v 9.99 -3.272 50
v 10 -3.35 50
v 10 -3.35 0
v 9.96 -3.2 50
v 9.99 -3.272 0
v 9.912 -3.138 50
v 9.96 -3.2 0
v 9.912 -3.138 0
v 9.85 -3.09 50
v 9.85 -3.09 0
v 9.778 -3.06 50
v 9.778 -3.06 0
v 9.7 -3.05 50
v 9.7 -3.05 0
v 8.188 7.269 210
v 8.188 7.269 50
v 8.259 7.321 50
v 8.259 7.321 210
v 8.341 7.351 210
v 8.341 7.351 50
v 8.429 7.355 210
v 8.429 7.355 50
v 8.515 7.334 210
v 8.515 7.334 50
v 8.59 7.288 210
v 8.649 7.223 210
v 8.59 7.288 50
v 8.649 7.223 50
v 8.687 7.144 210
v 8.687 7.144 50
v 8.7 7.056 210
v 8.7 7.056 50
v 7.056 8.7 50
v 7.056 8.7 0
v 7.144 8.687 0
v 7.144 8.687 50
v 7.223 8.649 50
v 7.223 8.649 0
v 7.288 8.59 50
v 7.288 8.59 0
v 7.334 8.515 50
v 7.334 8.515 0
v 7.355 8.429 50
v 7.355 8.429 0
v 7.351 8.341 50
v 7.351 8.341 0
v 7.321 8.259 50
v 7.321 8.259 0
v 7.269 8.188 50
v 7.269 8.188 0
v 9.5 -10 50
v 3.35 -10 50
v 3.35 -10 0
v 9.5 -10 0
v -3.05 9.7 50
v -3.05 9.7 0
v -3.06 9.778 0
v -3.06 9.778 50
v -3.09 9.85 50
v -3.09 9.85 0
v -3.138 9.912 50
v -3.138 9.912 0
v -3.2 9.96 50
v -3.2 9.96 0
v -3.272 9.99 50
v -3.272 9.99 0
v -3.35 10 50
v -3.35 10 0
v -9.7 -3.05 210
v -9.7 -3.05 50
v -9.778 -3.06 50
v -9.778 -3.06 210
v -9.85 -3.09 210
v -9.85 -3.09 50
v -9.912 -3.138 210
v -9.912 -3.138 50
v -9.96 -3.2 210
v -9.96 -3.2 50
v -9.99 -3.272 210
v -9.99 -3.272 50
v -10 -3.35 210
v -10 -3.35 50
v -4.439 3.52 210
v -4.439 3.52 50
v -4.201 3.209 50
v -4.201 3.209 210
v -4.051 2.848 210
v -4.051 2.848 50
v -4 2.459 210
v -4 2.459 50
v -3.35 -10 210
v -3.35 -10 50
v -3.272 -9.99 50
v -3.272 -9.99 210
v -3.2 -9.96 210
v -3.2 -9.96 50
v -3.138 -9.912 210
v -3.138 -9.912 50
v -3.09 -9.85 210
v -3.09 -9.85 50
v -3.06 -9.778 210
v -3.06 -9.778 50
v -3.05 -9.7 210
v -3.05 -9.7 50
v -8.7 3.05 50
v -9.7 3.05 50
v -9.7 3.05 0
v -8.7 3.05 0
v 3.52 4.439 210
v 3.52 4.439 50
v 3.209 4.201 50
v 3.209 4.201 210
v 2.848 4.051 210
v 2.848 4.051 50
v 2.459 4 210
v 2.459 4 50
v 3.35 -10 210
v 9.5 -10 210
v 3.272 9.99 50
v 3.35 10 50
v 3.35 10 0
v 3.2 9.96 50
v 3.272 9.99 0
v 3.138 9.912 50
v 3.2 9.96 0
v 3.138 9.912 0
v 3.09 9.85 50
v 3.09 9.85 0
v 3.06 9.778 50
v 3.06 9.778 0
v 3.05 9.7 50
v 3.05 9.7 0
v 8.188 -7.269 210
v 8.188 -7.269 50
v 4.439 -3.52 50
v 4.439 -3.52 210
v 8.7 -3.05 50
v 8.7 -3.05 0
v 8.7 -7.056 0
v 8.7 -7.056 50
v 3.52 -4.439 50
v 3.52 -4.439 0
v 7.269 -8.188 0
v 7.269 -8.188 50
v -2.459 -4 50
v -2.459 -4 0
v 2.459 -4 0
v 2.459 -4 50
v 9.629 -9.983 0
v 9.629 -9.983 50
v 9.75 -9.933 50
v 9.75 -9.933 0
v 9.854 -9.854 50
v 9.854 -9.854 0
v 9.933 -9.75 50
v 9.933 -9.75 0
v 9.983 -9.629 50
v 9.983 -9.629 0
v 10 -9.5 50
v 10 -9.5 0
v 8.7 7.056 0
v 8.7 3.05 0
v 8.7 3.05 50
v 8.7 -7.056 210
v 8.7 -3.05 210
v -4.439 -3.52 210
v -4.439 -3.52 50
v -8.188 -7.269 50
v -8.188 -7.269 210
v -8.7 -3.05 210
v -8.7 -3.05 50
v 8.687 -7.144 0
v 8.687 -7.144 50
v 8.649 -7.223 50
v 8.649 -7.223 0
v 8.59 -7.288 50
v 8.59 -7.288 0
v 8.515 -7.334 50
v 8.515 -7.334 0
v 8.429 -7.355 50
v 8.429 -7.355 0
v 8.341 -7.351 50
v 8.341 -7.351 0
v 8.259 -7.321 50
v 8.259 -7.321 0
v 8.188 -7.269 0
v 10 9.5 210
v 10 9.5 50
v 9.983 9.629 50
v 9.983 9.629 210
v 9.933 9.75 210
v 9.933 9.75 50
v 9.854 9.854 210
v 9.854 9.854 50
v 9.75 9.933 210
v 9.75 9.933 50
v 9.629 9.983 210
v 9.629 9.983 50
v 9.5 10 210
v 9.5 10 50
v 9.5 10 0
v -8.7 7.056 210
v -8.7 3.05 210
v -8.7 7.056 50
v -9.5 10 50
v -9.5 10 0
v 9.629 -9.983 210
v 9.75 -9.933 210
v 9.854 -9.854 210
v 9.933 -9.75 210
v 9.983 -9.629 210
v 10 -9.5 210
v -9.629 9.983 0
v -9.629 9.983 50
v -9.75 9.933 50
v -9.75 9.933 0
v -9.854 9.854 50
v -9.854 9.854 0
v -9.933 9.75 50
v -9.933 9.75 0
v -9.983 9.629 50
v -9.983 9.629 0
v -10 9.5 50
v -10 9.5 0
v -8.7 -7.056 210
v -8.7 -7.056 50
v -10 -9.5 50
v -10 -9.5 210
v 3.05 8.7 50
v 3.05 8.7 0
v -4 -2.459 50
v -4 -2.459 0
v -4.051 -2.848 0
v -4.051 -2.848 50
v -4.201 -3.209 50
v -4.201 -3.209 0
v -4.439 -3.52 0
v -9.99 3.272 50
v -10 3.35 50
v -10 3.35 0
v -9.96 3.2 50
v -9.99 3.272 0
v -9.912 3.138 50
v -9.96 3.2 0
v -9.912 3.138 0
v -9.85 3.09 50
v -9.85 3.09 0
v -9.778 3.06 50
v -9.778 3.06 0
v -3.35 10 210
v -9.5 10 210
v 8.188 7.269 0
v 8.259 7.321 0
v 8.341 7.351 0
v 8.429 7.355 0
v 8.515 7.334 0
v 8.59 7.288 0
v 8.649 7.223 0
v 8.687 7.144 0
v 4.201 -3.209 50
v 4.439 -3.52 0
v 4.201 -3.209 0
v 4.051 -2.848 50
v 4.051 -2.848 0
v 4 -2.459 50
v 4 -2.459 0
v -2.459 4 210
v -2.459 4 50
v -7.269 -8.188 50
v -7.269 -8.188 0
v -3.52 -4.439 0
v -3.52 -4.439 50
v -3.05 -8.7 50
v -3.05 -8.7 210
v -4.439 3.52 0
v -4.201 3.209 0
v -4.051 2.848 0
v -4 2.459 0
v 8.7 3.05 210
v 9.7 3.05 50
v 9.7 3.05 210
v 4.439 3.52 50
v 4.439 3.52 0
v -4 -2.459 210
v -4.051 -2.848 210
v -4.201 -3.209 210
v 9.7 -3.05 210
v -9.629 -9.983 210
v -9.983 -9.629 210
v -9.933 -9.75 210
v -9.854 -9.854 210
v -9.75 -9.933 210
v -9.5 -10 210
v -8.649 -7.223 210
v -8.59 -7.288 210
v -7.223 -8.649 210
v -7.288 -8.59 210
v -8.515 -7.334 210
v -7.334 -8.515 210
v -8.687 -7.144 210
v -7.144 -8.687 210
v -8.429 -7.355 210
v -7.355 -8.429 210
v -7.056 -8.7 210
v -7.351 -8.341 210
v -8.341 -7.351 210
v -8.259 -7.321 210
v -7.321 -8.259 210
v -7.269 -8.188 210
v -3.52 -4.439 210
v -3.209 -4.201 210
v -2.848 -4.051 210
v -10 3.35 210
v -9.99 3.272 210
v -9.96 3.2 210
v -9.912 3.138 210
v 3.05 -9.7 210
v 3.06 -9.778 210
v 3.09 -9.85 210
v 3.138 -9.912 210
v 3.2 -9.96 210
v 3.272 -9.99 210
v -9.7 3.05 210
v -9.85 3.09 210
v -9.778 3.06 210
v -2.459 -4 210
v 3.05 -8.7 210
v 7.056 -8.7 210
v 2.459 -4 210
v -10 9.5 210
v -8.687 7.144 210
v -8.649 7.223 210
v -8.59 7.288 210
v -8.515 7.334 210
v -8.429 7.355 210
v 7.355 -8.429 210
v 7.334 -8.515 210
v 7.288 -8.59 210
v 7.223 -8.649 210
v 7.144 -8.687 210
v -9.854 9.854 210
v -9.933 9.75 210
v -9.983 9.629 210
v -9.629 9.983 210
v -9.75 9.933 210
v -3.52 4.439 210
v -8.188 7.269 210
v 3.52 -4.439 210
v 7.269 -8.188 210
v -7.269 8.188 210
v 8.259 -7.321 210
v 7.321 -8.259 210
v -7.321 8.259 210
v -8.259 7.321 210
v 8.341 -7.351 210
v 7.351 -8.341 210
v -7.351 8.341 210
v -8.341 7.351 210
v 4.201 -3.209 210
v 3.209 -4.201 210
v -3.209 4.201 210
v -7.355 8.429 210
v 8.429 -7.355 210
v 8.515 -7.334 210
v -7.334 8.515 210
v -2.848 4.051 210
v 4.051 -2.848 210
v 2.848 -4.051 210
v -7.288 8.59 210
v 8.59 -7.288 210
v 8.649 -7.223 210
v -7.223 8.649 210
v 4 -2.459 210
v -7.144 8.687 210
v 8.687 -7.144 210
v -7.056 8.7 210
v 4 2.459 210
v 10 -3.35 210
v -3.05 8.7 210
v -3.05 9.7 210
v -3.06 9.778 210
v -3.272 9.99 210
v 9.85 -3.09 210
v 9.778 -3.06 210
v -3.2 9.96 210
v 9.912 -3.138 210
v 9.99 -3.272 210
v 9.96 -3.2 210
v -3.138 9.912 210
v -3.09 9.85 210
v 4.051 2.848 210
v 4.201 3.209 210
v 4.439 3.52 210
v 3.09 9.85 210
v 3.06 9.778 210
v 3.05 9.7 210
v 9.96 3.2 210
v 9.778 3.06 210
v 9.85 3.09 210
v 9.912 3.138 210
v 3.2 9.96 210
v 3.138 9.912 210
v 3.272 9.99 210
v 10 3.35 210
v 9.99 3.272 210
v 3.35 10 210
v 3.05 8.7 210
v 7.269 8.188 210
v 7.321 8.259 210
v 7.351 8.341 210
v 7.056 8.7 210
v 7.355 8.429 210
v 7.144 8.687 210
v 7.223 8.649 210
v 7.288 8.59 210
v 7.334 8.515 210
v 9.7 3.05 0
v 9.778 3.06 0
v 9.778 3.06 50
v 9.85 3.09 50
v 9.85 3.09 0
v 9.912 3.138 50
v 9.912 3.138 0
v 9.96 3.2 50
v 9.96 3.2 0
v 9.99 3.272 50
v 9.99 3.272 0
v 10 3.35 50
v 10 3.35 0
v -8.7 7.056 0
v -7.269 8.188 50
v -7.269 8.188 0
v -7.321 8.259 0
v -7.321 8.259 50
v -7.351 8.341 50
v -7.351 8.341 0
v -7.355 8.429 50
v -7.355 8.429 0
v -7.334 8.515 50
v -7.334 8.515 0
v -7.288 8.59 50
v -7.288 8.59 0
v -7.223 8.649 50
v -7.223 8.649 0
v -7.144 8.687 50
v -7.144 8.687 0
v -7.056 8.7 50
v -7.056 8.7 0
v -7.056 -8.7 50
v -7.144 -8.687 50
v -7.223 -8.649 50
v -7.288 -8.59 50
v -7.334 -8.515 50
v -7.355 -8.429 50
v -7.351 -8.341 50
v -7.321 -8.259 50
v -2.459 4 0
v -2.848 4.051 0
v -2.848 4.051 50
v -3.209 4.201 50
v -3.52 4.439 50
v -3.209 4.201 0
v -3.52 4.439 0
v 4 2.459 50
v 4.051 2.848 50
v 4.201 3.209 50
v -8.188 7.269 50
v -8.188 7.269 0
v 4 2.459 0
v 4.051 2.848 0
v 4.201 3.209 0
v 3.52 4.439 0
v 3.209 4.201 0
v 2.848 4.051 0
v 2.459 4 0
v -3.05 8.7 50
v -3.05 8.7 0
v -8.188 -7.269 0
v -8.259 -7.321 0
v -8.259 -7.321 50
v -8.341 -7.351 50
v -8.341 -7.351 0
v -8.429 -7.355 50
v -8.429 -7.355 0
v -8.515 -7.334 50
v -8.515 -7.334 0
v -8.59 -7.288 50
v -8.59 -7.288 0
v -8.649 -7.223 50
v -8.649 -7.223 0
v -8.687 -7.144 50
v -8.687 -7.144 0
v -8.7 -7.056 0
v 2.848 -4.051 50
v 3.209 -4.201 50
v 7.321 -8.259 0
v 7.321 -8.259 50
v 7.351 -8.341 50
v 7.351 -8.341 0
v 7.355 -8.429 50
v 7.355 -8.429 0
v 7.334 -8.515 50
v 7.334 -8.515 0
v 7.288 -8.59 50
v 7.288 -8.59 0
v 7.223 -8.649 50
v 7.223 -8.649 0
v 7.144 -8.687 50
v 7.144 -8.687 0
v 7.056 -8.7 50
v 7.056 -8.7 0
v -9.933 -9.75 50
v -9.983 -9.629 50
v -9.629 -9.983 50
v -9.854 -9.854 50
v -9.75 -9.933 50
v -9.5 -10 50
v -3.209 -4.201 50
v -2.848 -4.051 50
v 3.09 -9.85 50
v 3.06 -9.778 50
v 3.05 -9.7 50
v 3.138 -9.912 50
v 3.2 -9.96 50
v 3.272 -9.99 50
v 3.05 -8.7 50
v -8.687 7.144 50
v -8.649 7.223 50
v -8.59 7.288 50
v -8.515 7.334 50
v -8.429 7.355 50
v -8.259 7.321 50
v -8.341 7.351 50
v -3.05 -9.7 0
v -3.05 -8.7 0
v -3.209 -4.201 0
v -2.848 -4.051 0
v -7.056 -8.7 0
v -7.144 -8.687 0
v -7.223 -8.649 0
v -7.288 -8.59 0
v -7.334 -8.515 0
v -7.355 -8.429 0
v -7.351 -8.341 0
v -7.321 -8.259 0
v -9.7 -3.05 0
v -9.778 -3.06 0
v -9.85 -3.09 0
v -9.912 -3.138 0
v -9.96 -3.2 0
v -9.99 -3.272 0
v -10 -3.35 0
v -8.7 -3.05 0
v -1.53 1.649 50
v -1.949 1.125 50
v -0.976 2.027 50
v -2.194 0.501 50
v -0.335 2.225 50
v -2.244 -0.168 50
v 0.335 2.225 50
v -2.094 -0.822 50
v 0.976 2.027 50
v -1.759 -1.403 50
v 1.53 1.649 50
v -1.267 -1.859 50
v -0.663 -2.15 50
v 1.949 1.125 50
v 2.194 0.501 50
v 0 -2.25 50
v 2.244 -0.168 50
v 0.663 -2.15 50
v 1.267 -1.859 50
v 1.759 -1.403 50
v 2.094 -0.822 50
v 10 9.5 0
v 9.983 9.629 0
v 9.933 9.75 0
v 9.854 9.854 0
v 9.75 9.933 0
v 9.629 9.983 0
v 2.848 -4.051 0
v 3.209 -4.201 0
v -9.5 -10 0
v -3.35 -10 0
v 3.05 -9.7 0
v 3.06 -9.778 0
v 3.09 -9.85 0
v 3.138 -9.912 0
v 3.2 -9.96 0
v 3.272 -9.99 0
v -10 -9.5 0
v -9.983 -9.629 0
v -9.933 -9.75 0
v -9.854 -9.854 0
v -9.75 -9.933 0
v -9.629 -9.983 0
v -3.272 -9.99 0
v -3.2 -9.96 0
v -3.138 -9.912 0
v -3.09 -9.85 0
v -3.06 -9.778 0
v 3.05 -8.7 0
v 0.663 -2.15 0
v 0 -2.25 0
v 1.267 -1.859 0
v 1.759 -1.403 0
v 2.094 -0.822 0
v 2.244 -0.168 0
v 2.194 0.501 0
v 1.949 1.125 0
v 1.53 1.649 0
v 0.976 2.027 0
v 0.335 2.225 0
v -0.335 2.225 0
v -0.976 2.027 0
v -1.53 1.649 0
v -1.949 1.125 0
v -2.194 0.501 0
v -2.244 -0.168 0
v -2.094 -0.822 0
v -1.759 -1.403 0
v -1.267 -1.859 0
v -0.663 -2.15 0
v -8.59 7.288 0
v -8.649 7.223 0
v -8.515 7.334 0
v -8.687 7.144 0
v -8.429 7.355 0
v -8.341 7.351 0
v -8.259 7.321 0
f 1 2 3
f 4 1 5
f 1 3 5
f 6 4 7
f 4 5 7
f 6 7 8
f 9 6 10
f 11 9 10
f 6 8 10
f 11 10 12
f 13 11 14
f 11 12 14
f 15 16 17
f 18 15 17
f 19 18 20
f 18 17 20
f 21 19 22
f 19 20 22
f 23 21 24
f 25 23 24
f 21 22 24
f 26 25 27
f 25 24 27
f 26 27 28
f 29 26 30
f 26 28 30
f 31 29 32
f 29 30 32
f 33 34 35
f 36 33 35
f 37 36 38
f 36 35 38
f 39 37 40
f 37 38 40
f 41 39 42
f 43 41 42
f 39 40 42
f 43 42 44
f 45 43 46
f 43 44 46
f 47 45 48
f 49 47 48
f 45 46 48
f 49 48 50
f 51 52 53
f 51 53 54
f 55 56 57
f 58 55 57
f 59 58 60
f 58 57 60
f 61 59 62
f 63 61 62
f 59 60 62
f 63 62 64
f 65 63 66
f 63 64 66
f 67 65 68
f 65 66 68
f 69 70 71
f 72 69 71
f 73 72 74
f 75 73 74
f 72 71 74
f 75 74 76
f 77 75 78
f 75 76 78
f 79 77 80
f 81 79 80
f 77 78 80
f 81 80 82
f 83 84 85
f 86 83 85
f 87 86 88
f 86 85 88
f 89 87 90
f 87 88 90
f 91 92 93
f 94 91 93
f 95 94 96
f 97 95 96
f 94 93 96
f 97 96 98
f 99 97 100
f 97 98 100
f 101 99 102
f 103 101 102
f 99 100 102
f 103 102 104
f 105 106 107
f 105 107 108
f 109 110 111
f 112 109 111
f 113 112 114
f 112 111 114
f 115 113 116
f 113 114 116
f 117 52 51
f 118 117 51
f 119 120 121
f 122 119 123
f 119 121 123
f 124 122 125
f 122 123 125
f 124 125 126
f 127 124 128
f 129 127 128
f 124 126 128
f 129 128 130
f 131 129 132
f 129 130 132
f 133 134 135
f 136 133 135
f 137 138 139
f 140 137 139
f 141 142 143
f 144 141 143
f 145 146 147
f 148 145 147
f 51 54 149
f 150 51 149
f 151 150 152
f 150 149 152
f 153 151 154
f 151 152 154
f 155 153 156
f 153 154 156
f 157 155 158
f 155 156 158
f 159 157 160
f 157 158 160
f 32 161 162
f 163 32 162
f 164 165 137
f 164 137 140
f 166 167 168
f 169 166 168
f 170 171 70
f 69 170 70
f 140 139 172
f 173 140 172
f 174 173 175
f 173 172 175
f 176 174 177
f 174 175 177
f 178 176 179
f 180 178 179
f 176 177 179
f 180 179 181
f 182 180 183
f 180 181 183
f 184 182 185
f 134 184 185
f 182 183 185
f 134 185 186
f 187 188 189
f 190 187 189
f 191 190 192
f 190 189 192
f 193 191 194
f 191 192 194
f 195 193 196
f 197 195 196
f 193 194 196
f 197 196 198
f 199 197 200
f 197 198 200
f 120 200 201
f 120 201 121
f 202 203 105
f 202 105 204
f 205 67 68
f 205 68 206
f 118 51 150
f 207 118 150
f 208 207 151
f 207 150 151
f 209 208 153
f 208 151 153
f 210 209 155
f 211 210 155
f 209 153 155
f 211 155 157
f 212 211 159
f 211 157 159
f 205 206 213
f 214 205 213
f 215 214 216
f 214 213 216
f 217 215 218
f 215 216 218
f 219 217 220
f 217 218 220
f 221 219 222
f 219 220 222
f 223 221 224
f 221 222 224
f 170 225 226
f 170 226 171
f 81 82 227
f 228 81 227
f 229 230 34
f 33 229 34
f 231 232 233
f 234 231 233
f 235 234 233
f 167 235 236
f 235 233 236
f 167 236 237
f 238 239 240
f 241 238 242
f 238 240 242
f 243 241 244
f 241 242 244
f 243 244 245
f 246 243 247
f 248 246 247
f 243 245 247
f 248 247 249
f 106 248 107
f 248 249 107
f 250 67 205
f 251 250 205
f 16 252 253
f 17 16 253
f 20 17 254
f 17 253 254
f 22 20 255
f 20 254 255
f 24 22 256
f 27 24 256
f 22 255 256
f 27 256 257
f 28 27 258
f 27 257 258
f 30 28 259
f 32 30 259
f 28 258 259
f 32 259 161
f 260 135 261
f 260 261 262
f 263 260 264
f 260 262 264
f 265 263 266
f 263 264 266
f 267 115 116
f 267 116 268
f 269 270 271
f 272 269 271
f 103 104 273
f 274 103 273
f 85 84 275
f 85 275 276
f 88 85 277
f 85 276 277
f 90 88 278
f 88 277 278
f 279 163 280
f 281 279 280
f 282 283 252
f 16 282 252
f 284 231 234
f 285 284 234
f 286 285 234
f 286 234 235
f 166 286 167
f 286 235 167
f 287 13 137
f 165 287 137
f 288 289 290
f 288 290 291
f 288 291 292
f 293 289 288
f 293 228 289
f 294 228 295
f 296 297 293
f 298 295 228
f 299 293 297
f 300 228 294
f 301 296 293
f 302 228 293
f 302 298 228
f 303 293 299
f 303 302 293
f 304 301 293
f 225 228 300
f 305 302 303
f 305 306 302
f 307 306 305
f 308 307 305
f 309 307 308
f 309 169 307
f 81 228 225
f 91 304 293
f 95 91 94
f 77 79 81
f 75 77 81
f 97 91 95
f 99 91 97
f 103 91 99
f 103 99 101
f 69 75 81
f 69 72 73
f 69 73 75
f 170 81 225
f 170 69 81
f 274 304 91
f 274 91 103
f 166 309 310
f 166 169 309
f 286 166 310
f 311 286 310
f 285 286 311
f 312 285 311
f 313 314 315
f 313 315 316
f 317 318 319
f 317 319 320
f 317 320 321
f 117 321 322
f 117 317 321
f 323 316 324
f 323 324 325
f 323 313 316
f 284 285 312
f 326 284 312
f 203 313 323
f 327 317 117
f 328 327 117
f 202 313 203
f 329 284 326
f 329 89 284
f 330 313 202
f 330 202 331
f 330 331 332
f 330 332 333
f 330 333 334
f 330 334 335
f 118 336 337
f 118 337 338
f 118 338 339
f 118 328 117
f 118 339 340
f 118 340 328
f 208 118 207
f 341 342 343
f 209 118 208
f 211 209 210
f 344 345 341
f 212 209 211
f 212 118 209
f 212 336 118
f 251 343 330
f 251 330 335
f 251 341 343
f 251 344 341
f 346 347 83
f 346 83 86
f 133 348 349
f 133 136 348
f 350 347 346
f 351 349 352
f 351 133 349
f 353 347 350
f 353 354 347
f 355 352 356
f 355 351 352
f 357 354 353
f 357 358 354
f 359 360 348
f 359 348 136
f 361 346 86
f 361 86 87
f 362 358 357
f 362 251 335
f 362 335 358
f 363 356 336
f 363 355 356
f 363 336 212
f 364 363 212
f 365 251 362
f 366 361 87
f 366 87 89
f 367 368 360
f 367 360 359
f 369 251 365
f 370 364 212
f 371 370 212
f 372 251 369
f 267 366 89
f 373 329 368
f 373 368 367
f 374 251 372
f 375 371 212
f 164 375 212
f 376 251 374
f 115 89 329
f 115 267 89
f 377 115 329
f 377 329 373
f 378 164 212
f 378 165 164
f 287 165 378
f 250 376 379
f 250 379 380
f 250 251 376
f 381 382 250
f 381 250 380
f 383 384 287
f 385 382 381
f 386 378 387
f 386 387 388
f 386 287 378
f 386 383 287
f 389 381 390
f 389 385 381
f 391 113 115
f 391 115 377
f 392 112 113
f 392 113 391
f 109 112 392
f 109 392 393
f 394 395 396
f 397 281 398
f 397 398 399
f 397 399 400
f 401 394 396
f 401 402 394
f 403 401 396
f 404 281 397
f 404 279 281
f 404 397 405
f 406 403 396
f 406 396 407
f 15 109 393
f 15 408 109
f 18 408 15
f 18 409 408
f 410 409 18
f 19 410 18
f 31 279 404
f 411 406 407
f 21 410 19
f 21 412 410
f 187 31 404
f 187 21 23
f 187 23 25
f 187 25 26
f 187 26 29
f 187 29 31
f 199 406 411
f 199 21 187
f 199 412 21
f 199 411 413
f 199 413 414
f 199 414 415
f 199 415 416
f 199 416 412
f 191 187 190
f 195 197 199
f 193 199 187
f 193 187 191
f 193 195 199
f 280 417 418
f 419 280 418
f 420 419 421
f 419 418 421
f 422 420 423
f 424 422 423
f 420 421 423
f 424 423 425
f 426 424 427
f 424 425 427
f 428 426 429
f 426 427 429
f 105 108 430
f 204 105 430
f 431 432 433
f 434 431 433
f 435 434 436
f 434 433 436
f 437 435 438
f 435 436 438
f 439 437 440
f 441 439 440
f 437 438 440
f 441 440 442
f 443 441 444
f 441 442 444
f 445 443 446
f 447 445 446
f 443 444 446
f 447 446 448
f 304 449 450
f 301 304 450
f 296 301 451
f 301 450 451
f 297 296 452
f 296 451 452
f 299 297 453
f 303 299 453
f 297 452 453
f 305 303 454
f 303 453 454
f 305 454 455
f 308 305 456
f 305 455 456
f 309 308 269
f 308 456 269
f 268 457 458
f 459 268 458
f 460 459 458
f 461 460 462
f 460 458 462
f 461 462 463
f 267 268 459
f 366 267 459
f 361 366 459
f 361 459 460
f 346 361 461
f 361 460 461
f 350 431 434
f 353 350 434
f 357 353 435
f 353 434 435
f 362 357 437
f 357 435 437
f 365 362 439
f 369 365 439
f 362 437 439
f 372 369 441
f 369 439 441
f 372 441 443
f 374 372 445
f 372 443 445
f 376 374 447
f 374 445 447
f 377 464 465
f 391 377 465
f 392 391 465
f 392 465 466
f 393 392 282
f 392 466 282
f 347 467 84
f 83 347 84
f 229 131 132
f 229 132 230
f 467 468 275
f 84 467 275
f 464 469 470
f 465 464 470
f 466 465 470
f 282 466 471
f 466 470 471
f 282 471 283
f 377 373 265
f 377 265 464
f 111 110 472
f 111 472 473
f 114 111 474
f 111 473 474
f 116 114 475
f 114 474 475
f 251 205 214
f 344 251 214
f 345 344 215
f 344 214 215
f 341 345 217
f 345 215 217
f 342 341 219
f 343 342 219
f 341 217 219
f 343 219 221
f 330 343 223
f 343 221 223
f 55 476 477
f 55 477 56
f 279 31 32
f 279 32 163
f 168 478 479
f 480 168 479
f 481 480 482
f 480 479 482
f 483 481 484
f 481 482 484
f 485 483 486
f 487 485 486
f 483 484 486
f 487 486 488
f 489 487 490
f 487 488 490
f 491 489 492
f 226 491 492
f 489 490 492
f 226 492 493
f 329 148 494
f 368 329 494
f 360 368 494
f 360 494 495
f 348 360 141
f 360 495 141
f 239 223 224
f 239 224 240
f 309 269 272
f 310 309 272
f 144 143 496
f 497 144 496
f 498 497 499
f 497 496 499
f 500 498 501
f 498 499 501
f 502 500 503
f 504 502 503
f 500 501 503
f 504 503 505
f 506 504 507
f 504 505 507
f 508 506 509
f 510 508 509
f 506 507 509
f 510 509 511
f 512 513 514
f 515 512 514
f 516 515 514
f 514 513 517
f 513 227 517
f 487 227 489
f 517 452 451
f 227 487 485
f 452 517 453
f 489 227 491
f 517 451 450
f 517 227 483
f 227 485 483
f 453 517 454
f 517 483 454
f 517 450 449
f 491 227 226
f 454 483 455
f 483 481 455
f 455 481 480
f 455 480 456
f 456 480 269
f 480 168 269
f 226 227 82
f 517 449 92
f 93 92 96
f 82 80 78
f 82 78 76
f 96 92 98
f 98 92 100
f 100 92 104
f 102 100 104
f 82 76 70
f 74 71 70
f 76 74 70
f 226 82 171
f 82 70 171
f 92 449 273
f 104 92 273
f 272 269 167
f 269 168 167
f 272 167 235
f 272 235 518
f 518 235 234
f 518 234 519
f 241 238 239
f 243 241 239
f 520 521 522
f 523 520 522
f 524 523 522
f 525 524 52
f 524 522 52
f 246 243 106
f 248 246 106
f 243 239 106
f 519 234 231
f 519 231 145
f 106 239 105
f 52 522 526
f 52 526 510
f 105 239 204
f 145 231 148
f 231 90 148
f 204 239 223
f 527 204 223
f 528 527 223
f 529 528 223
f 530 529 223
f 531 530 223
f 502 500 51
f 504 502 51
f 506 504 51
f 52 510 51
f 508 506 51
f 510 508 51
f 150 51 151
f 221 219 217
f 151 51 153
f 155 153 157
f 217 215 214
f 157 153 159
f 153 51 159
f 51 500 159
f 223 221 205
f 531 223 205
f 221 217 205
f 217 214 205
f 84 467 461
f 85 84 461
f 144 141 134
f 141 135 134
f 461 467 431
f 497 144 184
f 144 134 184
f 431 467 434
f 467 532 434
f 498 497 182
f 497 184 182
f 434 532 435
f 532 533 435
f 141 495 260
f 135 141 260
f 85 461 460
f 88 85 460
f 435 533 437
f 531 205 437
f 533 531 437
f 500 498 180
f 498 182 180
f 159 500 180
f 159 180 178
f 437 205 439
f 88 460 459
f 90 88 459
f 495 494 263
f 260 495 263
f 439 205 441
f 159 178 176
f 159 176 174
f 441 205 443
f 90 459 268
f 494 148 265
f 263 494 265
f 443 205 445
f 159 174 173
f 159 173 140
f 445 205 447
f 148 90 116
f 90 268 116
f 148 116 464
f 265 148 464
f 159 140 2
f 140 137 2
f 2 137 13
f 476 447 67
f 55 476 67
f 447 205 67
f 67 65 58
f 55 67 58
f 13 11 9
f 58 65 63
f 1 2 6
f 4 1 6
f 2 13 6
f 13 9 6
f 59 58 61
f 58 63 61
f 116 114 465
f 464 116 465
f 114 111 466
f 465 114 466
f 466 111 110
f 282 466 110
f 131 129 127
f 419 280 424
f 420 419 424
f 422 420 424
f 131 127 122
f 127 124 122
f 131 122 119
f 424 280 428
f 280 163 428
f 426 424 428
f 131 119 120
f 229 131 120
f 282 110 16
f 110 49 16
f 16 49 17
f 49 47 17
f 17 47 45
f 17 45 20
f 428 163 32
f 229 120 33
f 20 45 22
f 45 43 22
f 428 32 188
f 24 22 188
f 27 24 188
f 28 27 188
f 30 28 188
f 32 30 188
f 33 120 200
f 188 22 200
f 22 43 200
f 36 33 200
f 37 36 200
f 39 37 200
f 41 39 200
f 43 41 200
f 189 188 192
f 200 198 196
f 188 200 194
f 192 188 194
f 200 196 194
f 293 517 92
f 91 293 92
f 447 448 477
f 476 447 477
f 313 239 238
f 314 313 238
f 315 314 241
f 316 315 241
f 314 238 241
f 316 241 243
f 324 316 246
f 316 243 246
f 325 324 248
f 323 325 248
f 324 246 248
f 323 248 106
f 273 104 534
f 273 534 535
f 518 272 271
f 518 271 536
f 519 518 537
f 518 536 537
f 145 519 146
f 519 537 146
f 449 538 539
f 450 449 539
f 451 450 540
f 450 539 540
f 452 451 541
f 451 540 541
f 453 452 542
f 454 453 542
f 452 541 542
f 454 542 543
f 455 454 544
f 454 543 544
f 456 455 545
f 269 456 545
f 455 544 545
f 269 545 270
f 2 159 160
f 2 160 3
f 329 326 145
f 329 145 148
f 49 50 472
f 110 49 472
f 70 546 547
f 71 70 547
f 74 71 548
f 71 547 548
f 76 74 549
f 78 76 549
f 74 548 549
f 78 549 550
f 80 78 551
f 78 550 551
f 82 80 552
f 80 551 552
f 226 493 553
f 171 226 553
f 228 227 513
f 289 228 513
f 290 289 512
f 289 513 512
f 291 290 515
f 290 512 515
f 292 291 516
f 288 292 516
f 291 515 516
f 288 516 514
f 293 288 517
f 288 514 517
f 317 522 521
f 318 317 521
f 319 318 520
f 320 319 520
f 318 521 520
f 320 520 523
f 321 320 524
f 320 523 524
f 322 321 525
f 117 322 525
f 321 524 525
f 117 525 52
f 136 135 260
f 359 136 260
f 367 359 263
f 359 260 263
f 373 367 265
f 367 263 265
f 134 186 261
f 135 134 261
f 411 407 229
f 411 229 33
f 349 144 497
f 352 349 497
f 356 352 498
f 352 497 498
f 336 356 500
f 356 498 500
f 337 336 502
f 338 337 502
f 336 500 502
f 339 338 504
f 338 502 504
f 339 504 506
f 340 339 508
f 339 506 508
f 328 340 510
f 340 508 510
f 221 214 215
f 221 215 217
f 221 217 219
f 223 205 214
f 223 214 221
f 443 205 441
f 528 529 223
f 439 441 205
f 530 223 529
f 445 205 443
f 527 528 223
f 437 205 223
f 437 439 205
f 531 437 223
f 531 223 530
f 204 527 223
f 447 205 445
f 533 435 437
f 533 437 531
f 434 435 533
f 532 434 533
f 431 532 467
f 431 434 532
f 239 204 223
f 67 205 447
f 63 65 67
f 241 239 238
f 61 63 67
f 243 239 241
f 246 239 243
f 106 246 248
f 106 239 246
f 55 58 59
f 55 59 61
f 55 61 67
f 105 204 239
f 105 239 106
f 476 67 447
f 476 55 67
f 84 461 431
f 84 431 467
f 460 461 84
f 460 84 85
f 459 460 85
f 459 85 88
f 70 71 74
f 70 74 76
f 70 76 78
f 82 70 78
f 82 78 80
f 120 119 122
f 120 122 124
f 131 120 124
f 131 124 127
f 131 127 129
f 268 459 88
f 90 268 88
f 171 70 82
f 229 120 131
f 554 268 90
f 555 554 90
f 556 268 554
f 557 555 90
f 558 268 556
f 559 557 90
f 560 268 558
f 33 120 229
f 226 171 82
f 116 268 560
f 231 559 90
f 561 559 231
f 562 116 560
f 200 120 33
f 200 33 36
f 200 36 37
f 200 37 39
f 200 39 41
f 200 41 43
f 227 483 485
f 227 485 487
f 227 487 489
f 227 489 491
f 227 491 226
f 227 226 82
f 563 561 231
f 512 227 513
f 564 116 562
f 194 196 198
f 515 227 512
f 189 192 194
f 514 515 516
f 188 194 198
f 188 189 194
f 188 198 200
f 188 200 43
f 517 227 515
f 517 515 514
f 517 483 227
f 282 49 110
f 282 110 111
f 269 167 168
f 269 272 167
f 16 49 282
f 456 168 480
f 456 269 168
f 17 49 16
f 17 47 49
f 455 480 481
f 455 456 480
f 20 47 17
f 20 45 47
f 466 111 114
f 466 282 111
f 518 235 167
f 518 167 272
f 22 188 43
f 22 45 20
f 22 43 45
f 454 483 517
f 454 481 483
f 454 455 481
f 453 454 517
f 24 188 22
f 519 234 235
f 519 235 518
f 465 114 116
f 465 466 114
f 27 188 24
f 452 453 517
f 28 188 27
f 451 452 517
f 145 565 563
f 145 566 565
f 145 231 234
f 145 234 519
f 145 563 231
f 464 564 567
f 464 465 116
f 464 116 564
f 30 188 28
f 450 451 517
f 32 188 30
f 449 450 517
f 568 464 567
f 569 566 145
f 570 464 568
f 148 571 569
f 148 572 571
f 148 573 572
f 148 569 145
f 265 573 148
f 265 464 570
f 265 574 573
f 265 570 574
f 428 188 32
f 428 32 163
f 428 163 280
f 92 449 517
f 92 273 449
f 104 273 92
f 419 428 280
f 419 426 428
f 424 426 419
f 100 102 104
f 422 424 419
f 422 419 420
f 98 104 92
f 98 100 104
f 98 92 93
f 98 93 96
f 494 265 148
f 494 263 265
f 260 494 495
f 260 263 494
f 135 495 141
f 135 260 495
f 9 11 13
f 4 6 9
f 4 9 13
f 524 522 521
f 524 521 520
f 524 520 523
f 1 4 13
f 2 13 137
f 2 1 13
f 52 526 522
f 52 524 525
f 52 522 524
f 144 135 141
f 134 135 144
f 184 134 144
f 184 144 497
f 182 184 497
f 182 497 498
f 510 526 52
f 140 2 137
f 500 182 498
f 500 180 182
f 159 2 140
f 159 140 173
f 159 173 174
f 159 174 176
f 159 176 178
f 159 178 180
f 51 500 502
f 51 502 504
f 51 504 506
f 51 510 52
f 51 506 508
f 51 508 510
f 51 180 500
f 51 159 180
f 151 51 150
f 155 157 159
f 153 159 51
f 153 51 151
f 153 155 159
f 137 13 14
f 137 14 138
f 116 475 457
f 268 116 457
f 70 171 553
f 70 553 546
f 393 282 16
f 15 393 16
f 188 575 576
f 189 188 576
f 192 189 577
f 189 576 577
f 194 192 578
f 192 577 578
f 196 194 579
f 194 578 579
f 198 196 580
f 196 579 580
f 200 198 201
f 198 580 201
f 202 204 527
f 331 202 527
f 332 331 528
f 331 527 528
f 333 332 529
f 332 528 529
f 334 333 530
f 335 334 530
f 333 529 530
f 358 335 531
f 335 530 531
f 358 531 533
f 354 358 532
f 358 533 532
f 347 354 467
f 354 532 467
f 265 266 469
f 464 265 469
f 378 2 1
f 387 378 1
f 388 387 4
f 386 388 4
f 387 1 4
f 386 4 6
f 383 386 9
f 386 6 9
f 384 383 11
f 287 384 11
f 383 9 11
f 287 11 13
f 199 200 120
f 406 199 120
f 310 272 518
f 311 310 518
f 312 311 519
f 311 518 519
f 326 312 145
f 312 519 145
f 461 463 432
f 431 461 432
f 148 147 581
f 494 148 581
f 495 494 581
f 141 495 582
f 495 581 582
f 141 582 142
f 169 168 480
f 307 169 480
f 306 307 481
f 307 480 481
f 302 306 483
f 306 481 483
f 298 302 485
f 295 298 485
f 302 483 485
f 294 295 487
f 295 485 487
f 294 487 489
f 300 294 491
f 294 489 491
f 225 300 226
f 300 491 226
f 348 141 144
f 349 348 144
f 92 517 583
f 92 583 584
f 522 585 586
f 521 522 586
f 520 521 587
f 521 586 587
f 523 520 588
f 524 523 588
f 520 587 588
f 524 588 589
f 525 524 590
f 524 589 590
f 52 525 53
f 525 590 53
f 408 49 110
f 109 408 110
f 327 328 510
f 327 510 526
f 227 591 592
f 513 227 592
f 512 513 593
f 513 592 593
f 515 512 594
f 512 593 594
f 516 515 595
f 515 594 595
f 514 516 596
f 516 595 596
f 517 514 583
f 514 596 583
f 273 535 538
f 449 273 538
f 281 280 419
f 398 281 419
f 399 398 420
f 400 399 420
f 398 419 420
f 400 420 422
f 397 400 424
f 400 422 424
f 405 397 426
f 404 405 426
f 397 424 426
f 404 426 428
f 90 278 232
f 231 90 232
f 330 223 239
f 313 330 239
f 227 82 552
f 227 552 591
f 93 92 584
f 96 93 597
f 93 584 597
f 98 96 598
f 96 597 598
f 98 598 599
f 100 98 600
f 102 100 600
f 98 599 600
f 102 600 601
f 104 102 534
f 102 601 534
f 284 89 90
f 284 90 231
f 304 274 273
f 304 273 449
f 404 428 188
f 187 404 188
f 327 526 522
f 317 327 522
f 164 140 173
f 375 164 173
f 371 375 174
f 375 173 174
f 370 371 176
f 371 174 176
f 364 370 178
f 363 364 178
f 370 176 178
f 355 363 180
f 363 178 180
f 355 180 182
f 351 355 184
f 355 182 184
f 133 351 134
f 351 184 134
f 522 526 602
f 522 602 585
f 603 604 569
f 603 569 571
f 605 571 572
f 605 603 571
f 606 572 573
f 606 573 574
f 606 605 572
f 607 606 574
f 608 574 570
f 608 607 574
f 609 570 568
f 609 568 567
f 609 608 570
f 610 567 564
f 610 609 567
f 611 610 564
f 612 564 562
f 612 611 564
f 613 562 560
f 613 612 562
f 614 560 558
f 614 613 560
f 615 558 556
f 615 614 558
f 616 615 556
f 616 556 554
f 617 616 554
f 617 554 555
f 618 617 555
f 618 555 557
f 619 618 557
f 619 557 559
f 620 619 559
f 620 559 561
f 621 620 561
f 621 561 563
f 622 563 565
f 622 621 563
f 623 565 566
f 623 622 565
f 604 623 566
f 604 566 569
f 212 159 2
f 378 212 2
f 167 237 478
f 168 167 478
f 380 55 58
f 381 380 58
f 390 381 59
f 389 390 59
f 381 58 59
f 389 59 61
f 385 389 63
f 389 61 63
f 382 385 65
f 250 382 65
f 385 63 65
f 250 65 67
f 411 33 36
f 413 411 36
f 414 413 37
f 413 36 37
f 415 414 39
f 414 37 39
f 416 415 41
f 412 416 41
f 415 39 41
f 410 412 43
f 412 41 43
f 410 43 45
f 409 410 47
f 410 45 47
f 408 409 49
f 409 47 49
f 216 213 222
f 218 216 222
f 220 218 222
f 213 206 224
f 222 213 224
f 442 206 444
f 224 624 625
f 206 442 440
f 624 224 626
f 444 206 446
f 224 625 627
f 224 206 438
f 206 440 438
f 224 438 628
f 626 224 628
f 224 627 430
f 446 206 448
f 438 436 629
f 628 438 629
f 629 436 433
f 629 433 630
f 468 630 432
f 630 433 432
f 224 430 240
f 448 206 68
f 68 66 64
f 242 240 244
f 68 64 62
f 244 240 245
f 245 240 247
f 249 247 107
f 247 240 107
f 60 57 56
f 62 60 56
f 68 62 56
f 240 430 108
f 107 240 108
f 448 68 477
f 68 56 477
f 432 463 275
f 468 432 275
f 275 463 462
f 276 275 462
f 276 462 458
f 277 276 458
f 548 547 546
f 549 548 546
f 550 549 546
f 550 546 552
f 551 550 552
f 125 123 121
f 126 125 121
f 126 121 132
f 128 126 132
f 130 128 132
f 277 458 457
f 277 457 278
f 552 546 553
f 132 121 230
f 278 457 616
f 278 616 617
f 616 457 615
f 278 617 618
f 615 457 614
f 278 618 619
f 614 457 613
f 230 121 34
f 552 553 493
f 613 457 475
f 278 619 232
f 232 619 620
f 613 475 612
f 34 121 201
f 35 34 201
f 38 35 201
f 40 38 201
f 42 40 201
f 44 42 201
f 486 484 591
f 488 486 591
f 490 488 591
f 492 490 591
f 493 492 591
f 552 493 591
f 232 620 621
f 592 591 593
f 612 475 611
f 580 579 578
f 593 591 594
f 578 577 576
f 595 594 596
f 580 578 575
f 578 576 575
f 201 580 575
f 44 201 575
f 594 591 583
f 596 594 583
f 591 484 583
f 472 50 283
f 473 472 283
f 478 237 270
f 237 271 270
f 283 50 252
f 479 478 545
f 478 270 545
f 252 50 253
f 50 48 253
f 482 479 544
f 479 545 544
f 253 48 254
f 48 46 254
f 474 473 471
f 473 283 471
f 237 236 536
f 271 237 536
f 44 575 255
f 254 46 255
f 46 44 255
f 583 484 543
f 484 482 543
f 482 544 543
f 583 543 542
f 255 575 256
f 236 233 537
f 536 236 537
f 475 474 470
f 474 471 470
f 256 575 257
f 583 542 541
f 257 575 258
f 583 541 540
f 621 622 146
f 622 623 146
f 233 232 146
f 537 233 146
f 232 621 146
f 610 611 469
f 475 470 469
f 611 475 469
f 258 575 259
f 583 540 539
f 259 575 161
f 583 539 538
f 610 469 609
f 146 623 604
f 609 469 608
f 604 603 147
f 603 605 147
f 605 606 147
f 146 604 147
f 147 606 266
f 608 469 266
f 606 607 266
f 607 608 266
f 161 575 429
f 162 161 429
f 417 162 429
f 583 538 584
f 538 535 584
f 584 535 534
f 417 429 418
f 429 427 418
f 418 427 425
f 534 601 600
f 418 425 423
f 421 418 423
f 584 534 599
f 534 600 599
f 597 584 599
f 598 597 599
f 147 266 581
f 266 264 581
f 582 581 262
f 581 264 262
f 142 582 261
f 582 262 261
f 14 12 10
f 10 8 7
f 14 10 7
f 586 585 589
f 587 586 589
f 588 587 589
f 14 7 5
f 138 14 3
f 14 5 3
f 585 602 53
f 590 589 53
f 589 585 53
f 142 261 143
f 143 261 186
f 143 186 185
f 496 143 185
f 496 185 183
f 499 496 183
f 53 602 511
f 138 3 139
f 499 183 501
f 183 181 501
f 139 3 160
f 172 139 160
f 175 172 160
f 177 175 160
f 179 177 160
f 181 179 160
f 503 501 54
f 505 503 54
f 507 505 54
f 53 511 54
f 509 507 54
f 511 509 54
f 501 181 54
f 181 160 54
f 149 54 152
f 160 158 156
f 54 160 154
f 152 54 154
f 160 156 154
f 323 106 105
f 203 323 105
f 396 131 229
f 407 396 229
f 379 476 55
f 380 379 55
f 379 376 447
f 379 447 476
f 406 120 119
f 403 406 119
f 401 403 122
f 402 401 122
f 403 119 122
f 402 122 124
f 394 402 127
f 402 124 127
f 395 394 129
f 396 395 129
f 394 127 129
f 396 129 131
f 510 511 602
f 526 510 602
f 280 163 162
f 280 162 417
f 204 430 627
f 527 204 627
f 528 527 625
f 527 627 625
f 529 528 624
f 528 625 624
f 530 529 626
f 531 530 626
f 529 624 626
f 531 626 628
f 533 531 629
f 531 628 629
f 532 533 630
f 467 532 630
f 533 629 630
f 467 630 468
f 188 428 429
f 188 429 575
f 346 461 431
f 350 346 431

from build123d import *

# Parameters (mm, degrees)
ESBO_O11_R                                   = 2.25
QUADRADO_PF20_21_PERFIL_2020_T_SLOT_6M_DEPTH = 50
SALIENTE_EXTRUIR1_DEPTH                      = 160


with BuildPart() as part:
    # Esboço11 → Quadrado PF20-21 - PERFIL 2020 T-SLOT 6MM(1) (new body)
    with BuildSketch(Plane(origin=(0, 0, 0), x_dir=(0, -1, 0), z_dir=(0, 0, 1))):
        with BuildLine():
            Line((8.187867966, -7.26862915), (4.439339828, -3.520101013))
            ThreePointArc((4.439339828, -3.520101013), (4.114180701, -3.033465989), (4, -2.459440841))
            Line((4, -2.459440841), (4, 2.459440841))
            ThreePointArc((4, 2.459440841), (4.114180701, 3.033465989), (4.439339828, 3.520101013))
            Line((4.439339828, 3.520101013), (8.187867966, 7.26862915))
            ThreePointArc((8.187867966, 7.26862915), (8.51480503, 7.333660975), (8.7, 7.056497116))
            Line((8.7, 7.056497116), (8.7, 3.05))
            Line((8.7, 3.05), (9.7, 3.05))
            ThreePointArc((9.7, 3.05), (9.912132034, 3.137867966), (10, 3.35))
            Line((10, 3.35), (10, 9.5))
            ThreePointArc((10, 9.5), (9.853553391, 9.853553391), (9.5, 10))
            Line((9.5, 10), (3.35, 10))
            ThreePointArc((3.35, 10), (3.137867966, 9.912132034), (3.05, 9.7))
            Line((3.05, 9.7), (3.05, 8.7))
            Line((3.05, 8.7), (7.056497116, 8.7))
            ThreePointArc((7.056497116, 8.7), (7.333660975, 8.51480503), (7.26862915, 8.187867966))
            Line((7.26862915, 8.187867966), (3.520101013, 4.439339828))
            ThreePointArc((3.520101013, 4.439339828), (3.033465989, 4.114180701), (2.459440841, 4))
            Line((2.459440841, 4), (-2.459440841, 4))
            ThreePointArc((-2.459440841, 4), (-3.033465989, 4.114180701), (-3.520101013, 4.439339828))
            Line((-3.520101013, 4.439339828), (-7.26862915, 8.187867966))
            ThreePointArc((-7.26862915, 8.187867966), (-7.333660975, 8.51480503), (-7.056497116, 8.7))
            Line((-7.056497116, 8.7), (-3.05, 8.7))
            Line((-3.05, 8.7), (-3.05, 9.7))
            ThreePointArc((-3.05, 9.7), (-3.137867966, 9.912132034), (-3.35, 10))
            Line((-3.35, 10), (-9.5, 10))
            ThreePointArc((-9.5, 10), (-9.853553391, 9.853553391), (-10, 9.5))
            Line((-10, 9.5), (-10, 3.35))
            ThreePointArc((-10, 3.35), (-9.912132034, 3.137867966), (-9.7, 3.05))
            Line((-9.7, 3.05), (-8.7, 3.05))
            Line((-8.7, 3.05), (-8.7, 7.056497116))
            ThreePointArc((-8.7, 7.056497116), (-8.51480503, 7.333660975), (-8.187867966, 7.26862915))
            Line((-8.187867966, 7.26862915), (-4.439339828, 3.520101013))
            ThreePointArc((-4.439339828, 3.520101013), (-4.114180701, 3.033465989), (-4, 2.459440841))
            Line((-4, 2.459440841), (-4, -2.459440841))
            ThreePointArc((-4, -2.459440841), (-4.114180701, -3.033465989), (-4.439339828, -3.520101013))
            Line((-4.439339828, -3.520101013), (-8.187867966, -7.26862915))
            ThreePointArc((-8.187867966, -7.26862915), (-8.51480503, -7.333660975), (-8.7, -7.056497116))
            Line((-8.7, -7.056497116), (-8.7, -3.05))
            Line((-8.7, -3.05), (-9.7, -3.05))
            ThreePointArc((-9.7, -3.05), (-9.912132034, -3.137867966), (-10, -3.35))
            Line((-10, -3.35), (-10, -9.5))
            ThreePointArc((-10, -9.5), (-9.853553391, -9.853553391), (-9.5, -10))
            Line((-9.5, -10), (-3.35, -10))
            ThreePointArc((-3.35, -10), (-3.137867966, -9.912132034), (-3.05, -9.7))
            Line((-3.05, -9.7), (-3.05, -8.7))
            Line((-3.05, -8.7), (-7.056497116, -8.7))
            ThreePointArc((-7.056497116, -8.7), (-7.333660975, -8.51480503), (-7.26862915, -8.187867966))
            Line((-7.26862915, -8.187867966), (-3.520101013, -4.439339828))
            ThreePointArc((-3.520101013, -4.439339828), (-3.033465989, -4.114180701), (-2.459440841, -4))
            Line((-2.459440841, -4), (2.459440841, -4))
            ThreePointArc((2.459440841, -4), (3.033465989, -4.114180701), (3.520101013, -4.439339828))
            Line((3.520101013, -4.439339828), (7.26862915, -8.187867966))
            ThreePointArc((7.26862915, -8.187867966), (7.333660975, -8.51480503), (7.056497116, -8.7))
            Line((7.056497116, -8.7), (3.05, -8.7))
            Line((3.05, -8.7), (3.05, -9.7))
            ThreePointArc((3.05, -9.7), (3.137867966, -9.912132034), (3.35, -10))
            Line((3.35, -10), (9.5, -10))
            ThreePointArc((9.5, -10), (9.853553391, -9.853553391), (10, -9.5))
            Line((10, -9.5), (10, -3.35))
            ThreePointArc((10, -3.35), (9.912132034, -3.137867966), (9.7, -3.05))
            Line((9.7, -3.05), (8.7, -3.05))
            Line((8.7, -3.05), (8.7, -7.056497116))
            ThreePointArc((8.7, -7.056497116), (8.51480503, -7.333660975), (8.187867966, -7.26862915))
        make_face()
        Circle(ESBO_O11_R, mode=Mode.SUBTRACT)
    extrude(amount=QUADRADO_PF20_21_PERFIL_2020_T_SLOT_6M_DEPTH)


with BuildPart() as body_2:
    # Croquis1 → Saliente-Extruir1 (new body)
    with BuildSketch(Plane.XY.offset(50)):
        with BuildLine():
            Line((-7.26862915, -8.187867966), (-3.520101013, -4.439339828))
            ThreePointArc((-3.520101013, -4.439339828), (-3.033465989, -4.114180701), (-2.459440841, -4))
            Line((-2.459440841, -4), (2.459440841, -4))
            ThreePointArc((2.459440841, -4), (3.033465989, -4.114180701), (3.520101013, -4.439339828))
            Line((3.520101013, -4.439339828), (7.26862915, -8.187867966))
            ThreePointArc((7.26862915, -8.187867966), (7.333660975, -8.51480503), (7.056497116, -8.7))
            Line((7.056497116, -8.7), (3.05, -8.7))
            Line((3.05, -8.7), (3.05, -9.7))
            ThreePointArc((3.05, -9.7), (3.137867966, -9.912132034), (3.35, -10))
            Line((3.35, -10), (9.5, -10))
            ThreePointArc((9.5, -10), (9.853553391, -9.853553391), (10, -9.5))
            Line((10, -9.5), (10, -3.35))
            ThreePointArc((10, -3.35), (9.912132034, -3.137867966), (9.7, -3.05))
            Line((9.7, -3.05), (8.7, -3.05))
            Line((8.7, -3.05), (8.7, -7.056497116))
            ThreePointArc((8.7, -7.056497116), (8.51480503, -7.333660975), (8.187867966, -7.26862915))
            Line((8.187867966, -7.26862915), (4.439339828, -3.520101013))
            ThreePointArc((4.439339828, -3.520101013), (4.114180701, -3.033465989), (4, -2.459440841))
            Line((4, -2.459440841), (4, 2.459440841))
            ThreePointArc((4, 2.459440841), (4.114180701, 3.033465989), (4.439339828, 3.520101013))
            Line((4.439339828, 3.520101013), (8.187867966, 7.26862915))
            ThreePointArc((8.187867966, 7.26862915), (8.51480503, 7.333660975), (8.7, 7.056497116))
            Line((8.7, 7.056497116), (8.7, 3.05))
            Line((8.7, 3.05), (9.7, 3.05))
            ThreePointArc((9.7, 3.05), (9.912132034, 3.137867966), (10, 3.35))
            Line((10, 3.35), (10, 9.5))
            ThreePointArc((10, 9.5), (9.853553391, 9.853553391), (9.5, 10))
            Line((9.5, 10), (3.35, 10))
            ThreePointArc((3.35, 10), (3.137867966, 9.912132034), (3.05, 9.7))
            Line((3.05, 9.7), (3.05, 8.7))
            Line((3.05, 8.7), (7.056497116, 8.7))
            ThreePointArc((7.056497116, 8.7), (7.333660975, 8.51480503), (7.26862915, 8.187867966))
            Line((7.26862915, 8.187867966), (3.520101013, 4.439339828))
            ThreePointArc((3.520101013, 4.439339828), (3.033465989, 4.114180701), (2.459440841, 4))
            Line((2.459440841, 4), (-2.459440841, 4))
            ThreePointArc((-2.459440841, 4), (-3.033465989, 4.114180701), (-3.520101013, 4.439339828))
            Line((-3.520101013, 4.439339828), (-7.26862915, 8.187867966))
            ThreePointArc((-7.26862915, 8.187867966), (-7.333660975, 8.51480503), (-7.056497116, 8.7))
            Line((-7.056497116, 8.7), (-3.05, 8.7))
            Line((-3.05, 8.7), (-3.05, 9.7))
            ThreePointArc((-3.05, 9.7), (-3.137867966, 9.912132034), (-3.35, 10))
            Line((-3.35, 10), (-9.5, 10))
            ThreePointArc((-9.5, 10), (-9.853553391, 9.853553391), (-10, 9.5))
            Line((-10, 9.5), (-10, 3.35))
            ThreePointArc((-10, 3.35), (-9.912132034, 3.137867966), (-9.7, 3.05))
            Line((-9.7, 3.05), (-8.7, 3.05))
            Line((-8.7, 3.05), (-8.7, 7.056497116))
            ThreePointArc((-8.7, 7.056497116), (-8.51480503, 7.333660975), (-8.187867966, 7.26862915))
            Line((-8.187867966, 7.26862915), (-4.439339828, 3.520101013))
            ThreePointArc((-4.439339828, 3.520101013), (-4.114180701, 3.033465989), (-4, 2.459440841))
            Line((-4, 2.459440841), (-4, -2.459440841))
            ThreePointArc((-4, -2.459440841), (-4.114180701, -3.033465989), (-4.439339828, -3.520101013))
            Line((-4.439339828, -3.520101013), (-8.187867966, -7.26862915))
            ThreePointArc((-8.187867966, -7.26862915), (-8.51480503, -7.333660975), (-8.7, -7.056497116))
            Line((-8.7, -7.056497116), (-8.7, -3.05))
            Line((-8.7, -3.05), (-9.7, -3.05))
            ThreePointArc((-9.7, -3.05), (-9.912132034, -3.137867966), (-10, -3.35))
            Line((-10, -3.35), (-10, -9.5))
            ThreePointArc((-10, -9.5), (-9.853553391, -9.853553391), (-9.5, -10))
            Line((-9.5, -10), (-3.35, -10))
            ThreePointArc((-3.35, -10), (-3.137867966, -9.912132034), (-3.05, -9.7))
            Line((-3.05, -9.7), (-3.05, -8.7))
            Line((-3.05, -8.7), (-7.056497116, -8.7))
            ThreePointArc((-7.056497116, -8.7), (-7.333660975, -8.51480503), (-7.26862915, -8.187867966))
        make_face()
    extrude(amount=SALIENTE_EXTRUIR1_DEPTH)


solid = Compound([part.part, body_2.part])
